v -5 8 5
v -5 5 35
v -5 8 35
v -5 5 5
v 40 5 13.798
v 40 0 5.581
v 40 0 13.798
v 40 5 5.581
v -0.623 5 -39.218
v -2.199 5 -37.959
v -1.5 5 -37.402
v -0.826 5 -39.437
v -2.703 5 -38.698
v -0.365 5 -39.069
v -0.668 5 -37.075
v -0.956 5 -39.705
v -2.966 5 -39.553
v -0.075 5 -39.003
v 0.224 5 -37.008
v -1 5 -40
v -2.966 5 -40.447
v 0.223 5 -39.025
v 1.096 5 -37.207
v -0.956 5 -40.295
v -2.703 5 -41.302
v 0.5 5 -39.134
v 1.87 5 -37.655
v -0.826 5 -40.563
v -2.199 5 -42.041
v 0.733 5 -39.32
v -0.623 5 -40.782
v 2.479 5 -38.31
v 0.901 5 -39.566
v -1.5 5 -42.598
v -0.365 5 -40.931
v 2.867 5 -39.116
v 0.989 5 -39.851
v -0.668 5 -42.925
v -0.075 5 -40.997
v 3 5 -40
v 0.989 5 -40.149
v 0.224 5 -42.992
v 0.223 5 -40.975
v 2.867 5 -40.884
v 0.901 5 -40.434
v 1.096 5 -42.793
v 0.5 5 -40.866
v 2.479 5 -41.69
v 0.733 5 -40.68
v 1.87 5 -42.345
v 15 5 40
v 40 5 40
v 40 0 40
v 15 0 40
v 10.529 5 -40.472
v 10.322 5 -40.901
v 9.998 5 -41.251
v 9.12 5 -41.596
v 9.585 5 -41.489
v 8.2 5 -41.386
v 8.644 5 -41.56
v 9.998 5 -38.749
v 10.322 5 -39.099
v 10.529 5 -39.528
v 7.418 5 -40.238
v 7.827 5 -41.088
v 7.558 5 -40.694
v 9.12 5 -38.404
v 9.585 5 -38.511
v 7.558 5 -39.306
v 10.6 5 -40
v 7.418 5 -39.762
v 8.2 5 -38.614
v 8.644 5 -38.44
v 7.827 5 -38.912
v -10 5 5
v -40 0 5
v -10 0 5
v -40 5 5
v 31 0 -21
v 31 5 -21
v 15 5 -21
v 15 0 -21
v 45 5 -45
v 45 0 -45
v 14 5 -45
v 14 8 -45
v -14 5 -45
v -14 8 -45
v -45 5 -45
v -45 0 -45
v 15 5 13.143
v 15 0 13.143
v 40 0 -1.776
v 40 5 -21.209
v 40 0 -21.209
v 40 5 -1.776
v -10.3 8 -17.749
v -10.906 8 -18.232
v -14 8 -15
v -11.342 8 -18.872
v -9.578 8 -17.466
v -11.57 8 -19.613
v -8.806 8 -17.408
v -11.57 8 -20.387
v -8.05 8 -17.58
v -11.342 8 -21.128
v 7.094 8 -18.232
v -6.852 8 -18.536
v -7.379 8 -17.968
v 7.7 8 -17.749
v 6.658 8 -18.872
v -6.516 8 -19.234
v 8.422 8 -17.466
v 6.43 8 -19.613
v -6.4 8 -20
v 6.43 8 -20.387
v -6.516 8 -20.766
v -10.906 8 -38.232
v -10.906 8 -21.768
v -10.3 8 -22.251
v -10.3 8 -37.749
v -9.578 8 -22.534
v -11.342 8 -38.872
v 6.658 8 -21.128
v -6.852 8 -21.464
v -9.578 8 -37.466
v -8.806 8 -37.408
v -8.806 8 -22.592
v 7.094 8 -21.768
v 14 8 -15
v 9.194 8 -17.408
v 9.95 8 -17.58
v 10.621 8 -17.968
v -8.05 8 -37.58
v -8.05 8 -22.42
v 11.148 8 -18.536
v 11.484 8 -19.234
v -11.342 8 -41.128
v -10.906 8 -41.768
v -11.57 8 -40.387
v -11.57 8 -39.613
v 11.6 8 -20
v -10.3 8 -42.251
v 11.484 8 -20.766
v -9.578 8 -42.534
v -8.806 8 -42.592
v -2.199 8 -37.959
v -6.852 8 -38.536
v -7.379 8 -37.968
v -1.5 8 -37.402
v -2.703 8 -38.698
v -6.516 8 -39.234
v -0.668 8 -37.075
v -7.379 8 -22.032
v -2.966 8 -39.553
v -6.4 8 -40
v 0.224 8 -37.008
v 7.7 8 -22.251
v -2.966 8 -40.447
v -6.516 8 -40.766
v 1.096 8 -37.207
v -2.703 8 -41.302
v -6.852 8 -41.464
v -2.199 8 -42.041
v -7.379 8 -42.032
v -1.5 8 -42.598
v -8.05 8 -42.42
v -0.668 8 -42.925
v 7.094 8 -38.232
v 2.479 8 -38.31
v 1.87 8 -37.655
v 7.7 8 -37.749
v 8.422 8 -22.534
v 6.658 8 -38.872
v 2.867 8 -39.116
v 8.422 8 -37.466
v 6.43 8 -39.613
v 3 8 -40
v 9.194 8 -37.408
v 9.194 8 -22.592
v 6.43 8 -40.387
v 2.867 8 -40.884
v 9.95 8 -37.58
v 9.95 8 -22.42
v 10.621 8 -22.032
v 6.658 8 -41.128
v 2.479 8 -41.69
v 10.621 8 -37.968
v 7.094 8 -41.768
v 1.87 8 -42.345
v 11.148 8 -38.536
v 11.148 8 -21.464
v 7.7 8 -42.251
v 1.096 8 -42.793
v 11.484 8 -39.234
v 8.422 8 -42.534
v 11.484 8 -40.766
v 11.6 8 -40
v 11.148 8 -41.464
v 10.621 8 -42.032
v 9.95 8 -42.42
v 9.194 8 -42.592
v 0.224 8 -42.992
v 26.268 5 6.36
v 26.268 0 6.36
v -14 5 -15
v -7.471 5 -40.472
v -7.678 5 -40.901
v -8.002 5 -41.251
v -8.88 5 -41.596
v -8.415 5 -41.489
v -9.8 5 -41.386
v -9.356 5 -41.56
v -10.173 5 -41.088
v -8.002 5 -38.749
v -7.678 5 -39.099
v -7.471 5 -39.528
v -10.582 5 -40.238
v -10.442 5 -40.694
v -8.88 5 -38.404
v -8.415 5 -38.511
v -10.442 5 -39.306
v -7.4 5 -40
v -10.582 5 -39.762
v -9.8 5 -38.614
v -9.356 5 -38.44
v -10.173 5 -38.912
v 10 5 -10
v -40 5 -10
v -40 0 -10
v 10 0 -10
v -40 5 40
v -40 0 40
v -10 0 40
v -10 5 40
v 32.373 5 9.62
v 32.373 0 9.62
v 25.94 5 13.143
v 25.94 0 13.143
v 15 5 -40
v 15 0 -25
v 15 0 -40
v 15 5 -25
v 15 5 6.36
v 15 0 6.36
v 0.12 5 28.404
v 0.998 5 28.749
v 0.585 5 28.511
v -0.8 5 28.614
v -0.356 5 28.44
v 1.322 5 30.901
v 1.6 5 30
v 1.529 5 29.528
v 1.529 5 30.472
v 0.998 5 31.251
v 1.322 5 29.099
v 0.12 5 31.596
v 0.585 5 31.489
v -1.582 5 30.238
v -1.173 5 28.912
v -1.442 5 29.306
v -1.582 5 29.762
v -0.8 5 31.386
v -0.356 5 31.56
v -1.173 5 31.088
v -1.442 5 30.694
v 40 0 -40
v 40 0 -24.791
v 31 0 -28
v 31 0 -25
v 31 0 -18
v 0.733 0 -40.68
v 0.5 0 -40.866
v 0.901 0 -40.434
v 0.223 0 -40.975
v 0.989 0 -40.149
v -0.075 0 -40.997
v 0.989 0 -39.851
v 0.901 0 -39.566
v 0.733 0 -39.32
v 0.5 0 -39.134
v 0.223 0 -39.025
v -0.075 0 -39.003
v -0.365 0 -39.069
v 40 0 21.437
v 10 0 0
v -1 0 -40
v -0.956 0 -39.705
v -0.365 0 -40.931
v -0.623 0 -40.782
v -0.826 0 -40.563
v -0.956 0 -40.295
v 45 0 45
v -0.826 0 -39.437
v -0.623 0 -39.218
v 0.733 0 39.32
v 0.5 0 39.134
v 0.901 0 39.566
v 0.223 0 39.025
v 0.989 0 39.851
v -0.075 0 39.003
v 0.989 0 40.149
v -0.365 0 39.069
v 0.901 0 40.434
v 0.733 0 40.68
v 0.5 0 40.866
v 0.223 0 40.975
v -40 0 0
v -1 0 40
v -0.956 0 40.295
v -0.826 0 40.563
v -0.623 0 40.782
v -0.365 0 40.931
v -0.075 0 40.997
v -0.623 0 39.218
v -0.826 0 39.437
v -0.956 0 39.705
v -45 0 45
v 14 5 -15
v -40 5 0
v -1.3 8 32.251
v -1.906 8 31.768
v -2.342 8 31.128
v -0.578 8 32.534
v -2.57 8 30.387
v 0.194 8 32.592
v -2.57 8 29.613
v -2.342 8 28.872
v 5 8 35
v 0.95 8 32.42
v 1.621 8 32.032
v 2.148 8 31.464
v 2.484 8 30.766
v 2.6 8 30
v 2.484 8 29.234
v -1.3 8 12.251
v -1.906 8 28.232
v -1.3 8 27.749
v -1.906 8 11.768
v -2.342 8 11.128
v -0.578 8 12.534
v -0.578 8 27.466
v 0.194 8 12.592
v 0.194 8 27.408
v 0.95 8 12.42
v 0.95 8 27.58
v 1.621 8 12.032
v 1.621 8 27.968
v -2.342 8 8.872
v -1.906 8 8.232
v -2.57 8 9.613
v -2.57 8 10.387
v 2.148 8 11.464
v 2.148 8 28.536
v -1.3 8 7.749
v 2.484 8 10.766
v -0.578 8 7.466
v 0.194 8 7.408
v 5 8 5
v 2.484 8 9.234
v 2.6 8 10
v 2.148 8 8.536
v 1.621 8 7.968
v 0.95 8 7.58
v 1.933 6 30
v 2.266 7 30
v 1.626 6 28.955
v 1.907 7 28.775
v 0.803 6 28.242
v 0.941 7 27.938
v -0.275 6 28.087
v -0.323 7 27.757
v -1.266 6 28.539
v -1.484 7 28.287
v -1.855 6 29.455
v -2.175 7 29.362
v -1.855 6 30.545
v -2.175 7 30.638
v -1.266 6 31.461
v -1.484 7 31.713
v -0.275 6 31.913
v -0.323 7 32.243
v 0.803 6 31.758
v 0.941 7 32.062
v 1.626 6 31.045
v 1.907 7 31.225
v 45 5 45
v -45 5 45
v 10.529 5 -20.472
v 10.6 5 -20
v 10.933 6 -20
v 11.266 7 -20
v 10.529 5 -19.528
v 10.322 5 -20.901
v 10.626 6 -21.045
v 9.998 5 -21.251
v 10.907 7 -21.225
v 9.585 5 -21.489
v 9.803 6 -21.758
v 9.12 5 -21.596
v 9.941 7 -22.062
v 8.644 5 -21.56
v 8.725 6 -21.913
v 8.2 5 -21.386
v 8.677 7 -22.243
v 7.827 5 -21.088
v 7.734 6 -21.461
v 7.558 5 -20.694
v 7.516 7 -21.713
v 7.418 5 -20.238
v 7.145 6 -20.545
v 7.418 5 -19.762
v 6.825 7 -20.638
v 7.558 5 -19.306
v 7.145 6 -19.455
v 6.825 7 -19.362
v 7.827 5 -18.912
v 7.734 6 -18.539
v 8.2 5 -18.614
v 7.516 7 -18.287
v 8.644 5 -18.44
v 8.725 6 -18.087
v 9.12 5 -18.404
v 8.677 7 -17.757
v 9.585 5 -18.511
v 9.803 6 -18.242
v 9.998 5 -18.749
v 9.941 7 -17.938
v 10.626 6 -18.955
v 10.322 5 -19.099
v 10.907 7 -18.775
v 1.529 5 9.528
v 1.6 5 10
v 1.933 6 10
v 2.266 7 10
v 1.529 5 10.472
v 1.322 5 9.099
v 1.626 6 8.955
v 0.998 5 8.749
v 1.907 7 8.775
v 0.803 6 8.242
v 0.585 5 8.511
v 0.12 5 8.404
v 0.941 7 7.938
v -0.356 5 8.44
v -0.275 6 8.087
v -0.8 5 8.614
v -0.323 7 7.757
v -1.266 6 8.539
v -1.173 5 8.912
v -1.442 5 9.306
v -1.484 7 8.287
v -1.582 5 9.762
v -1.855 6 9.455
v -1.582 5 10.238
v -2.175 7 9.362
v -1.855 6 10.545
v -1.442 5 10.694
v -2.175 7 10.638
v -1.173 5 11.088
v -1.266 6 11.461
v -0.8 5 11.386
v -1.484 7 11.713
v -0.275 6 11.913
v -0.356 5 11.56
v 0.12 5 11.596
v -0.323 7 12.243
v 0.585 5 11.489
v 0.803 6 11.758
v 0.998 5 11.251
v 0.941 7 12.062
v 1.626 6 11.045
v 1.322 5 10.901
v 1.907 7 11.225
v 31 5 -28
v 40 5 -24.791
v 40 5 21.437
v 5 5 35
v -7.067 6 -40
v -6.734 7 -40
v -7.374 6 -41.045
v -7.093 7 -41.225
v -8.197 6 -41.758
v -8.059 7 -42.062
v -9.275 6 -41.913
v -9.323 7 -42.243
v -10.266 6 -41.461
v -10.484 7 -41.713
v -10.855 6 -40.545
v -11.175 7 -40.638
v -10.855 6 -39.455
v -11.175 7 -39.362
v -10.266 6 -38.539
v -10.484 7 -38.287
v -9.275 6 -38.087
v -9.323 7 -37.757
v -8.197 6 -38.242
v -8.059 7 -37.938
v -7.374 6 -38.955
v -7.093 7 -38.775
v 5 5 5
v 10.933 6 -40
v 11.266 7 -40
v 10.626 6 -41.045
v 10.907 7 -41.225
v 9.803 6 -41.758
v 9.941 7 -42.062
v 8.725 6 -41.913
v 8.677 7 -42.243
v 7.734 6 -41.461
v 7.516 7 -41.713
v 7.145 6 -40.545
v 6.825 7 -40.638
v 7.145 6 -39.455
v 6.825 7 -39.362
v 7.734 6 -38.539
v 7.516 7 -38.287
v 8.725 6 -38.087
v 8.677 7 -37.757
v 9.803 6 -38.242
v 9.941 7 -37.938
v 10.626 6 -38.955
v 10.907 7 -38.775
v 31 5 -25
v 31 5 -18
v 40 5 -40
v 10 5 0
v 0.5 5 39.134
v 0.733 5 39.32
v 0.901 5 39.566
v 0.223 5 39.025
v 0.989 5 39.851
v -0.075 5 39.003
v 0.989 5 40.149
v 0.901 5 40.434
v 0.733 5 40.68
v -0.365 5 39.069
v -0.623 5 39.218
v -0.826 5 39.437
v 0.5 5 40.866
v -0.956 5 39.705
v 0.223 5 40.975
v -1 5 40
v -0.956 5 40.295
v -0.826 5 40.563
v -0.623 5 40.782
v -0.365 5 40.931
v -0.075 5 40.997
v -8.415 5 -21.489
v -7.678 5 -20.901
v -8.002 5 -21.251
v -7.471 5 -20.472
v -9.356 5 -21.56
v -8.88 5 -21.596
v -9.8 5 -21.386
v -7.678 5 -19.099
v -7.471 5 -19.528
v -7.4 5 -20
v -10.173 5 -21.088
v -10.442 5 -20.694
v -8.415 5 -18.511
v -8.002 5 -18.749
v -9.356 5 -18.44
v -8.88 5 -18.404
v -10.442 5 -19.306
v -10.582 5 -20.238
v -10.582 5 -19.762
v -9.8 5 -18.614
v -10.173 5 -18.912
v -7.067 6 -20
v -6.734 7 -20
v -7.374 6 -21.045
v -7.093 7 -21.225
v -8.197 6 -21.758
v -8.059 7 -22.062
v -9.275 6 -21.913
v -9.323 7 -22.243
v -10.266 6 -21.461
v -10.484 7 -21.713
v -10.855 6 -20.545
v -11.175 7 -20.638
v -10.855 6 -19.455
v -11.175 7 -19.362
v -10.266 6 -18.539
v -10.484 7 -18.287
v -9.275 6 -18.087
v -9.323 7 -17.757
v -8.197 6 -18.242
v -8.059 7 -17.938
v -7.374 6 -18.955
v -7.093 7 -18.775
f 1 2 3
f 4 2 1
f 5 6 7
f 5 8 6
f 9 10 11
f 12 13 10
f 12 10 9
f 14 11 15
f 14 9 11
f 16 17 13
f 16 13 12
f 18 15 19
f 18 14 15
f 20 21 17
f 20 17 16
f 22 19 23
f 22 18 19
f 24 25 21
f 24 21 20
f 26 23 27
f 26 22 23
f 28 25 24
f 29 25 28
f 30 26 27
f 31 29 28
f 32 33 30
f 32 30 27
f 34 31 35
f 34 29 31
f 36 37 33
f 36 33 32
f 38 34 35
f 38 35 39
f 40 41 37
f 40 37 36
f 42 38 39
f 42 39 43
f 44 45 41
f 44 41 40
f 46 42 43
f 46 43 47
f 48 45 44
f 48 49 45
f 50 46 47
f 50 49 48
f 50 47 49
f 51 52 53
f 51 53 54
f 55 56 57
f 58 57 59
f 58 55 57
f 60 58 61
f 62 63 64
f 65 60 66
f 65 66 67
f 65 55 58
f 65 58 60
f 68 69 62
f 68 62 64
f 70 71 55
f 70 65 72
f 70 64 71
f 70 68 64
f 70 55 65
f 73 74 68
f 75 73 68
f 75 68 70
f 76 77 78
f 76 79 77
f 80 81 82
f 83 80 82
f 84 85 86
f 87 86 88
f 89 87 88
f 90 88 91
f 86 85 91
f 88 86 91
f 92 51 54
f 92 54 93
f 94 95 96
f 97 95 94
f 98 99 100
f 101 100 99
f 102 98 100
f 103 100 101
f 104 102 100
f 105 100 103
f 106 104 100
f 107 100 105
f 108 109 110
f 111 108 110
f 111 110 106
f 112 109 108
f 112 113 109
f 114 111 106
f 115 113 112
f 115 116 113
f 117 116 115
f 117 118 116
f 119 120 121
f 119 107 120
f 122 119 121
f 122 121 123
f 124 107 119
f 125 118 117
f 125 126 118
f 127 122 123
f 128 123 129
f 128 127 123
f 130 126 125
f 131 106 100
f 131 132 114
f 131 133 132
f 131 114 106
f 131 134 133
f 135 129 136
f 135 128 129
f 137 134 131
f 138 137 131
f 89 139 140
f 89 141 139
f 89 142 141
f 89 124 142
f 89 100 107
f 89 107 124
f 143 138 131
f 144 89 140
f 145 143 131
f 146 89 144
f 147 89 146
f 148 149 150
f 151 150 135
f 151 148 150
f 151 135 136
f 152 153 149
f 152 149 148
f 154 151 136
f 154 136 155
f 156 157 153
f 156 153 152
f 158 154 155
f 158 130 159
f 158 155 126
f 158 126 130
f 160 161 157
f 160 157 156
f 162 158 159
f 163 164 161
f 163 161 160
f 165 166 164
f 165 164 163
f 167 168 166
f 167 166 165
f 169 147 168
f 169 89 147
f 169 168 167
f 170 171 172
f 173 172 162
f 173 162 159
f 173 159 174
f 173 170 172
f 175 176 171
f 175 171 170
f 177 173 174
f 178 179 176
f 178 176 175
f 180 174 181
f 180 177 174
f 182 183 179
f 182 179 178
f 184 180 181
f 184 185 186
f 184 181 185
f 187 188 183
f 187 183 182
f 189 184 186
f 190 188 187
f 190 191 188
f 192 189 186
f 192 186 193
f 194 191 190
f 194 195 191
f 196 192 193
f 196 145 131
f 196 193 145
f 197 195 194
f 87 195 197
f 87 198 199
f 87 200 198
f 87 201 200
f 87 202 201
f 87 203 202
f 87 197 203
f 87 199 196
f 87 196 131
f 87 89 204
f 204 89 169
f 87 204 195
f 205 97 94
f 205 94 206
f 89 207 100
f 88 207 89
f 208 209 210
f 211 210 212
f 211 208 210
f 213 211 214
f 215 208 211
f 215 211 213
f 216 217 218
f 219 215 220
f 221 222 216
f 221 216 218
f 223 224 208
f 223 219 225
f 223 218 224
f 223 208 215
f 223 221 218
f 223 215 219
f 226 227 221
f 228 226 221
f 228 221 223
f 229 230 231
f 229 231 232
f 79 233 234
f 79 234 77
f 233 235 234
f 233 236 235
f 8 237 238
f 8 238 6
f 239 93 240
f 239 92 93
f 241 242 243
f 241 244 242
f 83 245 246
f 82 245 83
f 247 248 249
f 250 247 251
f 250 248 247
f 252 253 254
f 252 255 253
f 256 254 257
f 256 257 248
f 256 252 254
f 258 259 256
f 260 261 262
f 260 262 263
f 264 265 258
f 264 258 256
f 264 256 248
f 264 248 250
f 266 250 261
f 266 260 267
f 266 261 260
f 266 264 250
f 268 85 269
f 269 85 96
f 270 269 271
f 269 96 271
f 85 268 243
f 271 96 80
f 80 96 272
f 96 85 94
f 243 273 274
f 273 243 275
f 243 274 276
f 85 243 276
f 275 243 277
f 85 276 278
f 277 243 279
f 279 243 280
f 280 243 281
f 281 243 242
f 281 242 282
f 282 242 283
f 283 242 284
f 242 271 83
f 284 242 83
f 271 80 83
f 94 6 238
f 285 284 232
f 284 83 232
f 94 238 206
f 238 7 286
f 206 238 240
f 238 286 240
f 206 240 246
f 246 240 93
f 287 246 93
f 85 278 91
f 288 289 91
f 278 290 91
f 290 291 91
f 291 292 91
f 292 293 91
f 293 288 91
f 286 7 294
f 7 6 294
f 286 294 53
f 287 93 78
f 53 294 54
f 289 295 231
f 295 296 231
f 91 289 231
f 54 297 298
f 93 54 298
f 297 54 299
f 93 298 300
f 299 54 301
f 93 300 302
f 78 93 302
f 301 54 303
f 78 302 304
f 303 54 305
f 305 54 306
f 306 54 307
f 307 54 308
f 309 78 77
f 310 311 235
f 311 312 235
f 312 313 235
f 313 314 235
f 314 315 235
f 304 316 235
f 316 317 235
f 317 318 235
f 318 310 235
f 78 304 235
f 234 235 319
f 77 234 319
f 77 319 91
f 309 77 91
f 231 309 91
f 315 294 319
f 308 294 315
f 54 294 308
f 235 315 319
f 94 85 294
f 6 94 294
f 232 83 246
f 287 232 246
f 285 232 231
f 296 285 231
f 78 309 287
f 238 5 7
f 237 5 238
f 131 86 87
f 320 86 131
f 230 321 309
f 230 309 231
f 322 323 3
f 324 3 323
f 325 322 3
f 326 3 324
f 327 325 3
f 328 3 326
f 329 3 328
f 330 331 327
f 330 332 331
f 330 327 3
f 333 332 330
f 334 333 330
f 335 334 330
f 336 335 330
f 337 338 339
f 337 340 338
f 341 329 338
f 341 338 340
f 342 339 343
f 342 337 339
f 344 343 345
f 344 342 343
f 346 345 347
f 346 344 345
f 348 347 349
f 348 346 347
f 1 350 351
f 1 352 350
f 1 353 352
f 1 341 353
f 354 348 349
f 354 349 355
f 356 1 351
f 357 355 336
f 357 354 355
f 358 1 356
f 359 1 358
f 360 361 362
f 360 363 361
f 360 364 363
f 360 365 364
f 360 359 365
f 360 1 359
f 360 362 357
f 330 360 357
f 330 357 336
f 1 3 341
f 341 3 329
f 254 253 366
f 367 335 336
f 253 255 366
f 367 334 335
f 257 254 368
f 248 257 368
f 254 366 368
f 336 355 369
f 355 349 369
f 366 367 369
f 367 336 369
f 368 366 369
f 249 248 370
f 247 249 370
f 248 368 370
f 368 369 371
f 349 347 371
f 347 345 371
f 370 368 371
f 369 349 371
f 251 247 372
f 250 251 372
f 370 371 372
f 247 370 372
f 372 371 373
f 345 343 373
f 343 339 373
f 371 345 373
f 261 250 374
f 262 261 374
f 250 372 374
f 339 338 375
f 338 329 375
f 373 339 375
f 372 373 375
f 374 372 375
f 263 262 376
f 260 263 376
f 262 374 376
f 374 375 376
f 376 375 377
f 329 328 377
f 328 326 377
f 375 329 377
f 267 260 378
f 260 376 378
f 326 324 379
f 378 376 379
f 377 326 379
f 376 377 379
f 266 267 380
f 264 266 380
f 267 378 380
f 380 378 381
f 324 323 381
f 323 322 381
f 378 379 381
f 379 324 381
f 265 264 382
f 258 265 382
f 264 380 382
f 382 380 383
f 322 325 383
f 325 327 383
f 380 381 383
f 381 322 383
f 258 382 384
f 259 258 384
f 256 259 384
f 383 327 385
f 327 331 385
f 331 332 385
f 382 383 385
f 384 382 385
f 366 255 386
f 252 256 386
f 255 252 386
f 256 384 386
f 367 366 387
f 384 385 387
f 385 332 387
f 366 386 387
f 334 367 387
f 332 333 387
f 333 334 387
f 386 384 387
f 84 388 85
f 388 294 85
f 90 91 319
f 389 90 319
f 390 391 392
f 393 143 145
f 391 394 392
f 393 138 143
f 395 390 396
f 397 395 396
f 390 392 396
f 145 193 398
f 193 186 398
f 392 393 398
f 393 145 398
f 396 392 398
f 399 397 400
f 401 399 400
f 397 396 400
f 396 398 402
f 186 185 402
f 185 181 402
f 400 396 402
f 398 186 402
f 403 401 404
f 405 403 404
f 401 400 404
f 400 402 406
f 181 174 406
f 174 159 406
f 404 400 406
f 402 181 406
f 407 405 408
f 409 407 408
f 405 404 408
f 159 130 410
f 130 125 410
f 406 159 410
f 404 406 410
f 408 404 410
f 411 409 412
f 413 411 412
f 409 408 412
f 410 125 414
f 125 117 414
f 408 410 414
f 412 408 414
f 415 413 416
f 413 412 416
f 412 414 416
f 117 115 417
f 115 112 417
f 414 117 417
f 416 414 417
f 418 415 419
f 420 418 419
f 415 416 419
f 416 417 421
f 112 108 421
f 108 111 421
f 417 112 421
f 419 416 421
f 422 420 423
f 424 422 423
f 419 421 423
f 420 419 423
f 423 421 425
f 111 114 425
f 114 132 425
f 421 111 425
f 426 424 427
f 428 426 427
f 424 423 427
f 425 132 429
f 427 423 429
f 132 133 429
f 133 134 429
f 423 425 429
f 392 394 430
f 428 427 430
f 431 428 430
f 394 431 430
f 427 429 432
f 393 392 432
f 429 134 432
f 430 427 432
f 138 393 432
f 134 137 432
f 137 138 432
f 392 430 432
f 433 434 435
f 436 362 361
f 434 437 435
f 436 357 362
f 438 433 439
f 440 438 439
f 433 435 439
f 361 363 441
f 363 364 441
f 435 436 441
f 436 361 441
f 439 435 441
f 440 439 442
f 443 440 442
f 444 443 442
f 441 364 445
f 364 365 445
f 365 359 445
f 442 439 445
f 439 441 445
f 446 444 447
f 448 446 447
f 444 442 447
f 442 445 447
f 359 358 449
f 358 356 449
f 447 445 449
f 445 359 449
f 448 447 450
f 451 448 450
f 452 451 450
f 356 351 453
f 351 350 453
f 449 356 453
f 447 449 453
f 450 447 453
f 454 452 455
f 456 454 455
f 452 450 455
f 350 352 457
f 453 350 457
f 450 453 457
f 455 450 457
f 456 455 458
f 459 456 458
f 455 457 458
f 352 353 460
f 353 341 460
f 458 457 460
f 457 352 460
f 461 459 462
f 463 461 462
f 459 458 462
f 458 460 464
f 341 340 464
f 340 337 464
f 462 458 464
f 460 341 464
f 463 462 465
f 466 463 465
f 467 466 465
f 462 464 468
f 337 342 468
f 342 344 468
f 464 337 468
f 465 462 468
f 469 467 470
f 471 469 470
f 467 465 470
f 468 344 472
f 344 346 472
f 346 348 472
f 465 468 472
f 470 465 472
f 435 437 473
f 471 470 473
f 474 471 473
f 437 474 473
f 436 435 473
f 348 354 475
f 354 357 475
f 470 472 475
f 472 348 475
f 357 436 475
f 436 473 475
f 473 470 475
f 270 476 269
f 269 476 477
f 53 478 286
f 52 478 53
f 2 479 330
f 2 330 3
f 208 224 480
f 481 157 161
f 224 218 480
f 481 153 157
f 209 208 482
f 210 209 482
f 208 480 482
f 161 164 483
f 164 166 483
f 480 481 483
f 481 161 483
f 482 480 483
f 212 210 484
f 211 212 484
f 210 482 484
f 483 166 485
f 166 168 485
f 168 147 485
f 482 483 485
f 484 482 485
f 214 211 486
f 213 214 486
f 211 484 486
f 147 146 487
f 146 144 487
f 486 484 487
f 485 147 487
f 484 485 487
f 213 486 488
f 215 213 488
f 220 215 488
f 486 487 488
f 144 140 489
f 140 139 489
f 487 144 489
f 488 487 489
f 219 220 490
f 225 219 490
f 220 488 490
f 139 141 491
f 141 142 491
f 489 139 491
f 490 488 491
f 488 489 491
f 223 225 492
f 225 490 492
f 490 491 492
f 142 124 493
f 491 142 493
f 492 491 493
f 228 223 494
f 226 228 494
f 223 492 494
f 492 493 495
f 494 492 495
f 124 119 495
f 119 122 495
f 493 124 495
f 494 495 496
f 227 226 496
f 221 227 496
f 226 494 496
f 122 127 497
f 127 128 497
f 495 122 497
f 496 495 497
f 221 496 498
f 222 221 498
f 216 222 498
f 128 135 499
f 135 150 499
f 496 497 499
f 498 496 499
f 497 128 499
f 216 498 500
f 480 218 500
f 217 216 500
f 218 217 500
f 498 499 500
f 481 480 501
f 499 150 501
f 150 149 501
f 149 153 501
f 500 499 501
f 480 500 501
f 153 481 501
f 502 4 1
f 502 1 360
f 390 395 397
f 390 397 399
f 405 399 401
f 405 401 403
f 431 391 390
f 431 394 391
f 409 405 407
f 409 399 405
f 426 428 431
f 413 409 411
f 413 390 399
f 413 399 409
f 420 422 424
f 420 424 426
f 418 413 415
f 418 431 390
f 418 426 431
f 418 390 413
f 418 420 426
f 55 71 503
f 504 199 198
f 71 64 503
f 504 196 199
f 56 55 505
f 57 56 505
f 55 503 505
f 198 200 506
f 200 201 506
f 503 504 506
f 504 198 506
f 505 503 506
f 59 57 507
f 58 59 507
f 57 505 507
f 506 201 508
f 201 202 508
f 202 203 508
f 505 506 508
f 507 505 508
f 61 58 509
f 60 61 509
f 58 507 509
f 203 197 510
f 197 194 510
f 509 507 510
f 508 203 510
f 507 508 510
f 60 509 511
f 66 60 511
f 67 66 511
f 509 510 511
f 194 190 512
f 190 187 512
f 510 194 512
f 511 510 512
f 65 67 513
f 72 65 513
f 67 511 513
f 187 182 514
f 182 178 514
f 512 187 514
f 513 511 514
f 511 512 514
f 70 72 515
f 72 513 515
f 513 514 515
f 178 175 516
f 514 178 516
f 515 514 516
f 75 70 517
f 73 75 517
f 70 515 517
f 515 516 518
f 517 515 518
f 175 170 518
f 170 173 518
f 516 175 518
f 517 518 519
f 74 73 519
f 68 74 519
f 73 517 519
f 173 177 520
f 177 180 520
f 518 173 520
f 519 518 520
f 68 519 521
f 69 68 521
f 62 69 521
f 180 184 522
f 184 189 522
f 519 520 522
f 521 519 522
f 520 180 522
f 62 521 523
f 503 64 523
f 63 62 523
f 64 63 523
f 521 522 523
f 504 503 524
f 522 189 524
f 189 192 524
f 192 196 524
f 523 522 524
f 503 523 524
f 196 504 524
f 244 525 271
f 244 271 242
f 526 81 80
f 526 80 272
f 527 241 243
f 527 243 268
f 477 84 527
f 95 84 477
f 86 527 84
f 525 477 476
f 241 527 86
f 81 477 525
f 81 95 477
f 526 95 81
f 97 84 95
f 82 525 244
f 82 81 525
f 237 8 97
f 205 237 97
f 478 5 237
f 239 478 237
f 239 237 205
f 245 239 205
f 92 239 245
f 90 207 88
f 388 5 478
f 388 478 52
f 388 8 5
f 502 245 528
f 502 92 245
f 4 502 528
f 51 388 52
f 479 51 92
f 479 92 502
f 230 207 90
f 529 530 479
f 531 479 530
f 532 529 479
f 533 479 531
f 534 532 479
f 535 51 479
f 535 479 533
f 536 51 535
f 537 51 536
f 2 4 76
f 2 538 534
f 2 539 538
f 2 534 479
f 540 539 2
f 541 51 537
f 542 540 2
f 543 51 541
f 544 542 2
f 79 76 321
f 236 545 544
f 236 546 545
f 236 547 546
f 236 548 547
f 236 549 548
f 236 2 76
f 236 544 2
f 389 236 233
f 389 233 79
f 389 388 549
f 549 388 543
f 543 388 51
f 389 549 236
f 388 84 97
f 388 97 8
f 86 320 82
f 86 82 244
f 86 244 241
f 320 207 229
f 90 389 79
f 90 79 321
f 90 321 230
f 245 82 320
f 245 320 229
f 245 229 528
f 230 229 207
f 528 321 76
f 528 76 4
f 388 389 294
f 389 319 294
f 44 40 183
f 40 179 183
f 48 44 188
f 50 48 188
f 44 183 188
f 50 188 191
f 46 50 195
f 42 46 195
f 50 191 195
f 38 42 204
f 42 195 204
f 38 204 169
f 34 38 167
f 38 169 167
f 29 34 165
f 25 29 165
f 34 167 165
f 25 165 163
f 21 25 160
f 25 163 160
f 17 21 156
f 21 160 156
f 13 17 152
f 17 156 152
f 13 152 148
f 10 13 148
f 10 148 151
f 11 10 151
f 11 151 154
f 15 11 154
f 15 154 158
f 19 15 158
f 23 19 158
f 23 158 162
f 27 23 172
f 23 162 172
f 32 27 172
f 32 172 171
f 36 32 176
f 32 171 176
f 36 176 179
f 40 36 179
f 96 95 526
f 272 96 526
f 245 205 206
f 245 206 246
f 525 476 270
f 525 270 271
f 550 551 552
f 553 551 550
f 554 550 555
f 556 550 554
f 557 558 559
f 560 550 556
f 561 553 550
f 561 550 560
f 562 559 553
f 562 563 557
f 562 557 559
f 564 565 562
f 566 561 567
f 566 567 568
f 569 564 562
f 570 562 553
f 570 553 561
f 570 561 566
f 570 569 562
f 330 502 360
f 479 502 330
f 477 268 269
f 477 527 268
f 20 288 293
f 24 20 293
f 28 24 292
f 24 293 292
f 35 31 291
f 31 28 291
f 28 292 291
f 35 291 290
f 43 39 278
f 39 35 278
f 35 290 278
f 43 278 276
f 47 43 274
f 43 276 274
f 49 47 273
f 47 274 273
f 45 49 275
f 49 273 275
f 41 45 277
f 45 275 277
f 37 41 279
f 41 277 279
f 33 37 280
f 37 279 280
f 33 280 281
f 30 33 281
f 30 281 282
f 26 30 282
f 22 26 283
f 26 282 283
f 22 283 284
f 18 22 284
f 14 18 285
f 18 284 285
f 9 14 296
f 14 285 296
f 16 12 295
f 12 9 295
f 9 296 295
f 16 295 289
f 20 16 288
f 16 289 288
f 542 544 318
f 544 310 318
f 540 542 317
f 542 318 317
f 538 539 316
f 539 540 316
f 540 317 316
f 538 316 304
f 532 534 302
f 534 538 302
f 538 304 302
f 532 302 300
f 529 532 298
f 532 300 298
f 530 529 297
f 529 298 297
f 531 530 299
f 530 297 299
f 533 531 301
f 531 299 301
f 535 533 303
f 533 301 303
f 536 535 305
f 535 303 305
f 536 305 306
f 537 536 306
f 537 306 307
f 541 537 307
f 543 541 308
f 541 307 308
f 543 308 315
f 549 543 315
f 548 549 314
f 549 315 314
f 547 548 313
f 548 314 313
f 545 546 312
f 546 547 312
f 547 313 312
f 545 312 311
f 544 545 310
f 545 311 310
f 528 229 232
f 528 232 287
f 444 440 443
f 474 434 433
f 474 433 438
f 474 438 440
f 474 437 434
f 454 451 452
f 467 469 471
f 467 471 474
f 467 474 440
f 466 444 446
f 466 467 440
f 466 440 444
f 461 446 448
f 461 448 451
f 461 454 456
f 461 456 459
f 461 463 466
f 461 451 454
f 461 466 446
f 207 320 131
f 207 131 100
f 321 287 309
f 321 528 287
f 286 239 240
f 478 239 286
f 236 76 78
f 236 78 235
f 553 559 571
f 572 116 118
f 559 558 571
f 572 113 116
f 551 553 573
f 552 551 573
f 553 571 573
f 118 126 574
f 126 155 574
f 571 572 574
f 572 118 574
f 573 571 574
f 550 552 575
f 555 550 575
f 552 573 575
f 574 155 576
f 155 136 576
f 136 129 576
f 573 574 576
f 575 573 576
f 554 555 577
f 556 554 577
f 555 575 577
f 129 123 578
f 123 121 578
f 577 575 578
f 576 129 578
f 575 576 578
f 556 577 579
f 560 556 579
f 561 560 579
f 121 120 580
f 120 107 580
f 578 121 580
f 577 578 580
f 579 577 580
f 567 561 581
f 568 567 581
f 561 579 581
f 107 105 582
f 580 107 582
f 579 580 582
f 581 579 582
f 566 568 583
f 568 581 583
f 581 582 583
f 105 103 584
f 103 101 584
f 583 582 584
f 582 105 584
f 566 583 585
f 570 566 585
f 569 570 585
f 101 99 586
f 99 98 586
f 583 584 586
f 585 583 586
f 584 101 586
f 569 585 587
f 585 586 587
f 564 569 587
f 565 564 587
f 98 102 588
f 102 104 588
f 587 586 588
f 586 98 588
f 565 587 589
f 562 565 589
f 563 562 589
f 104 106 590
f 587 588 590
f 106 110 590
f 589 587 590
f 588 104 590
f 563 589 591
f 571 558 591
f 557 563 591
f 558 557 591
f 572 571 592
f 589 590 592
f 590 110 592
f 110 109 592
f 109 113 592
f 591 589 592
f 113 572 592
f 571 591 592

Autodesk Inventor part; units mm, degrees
ref_plane "YZ Plane" through (0, 0, 0) normal (1, 0, 0) x (0, 1, 0)
ref_plane "Arbeitsebene1" through (-75, 27.1, 0) normal (0, 0, 1) x (0, 1, 0)
sketch "center1" plane through (-75, 27.1, 0) normal (0, 0, 1) x (0, 1, 0)
  line L0 (-173.891, -75) -> (168.1592, -75)
  line L1 (0, 239.86) -> (0, -220.81)
  point P0 (-27.1, -75)
ref_plane "Arbeitsebene2" through (0, 99.4, -2.4) normal (-1, 0, 0) x (0, 0, 1)
sketch "center2" plane through (0, 99.4, -2.4) normal (-1, 0, 0) x (0, 0, 1)
  line L0 (184.8129, -72.3) -> (-258.9785, -72.3)
  point P0 (2.4, -99.4)
sketch "Hallsens" plane through (0, 0, 0) normal (0, 1, 0) x (-1, 0, 0)
  line L0 (406.994, 0) -> (-237.944, 0) construction
  line L1 (0, -350.1368) -> (0, 271.1712) construction
  line L2 (-5, 0) -> (5, 0) construction
  line L3 (5, 0) -> (5, -20) construction
  line L4 (5, -20) -> (-5, -20) construction
  line L5 (-5, -20) -> (-5, 0) construction
  line L6 (-4, -1) -> (-6, -1)
  line L7 (-6, -1) -> (-6, 1)
  line L8 (-6, 1) -> (-4, 1)
  line L9 (-4, 1) -> (-4, -1)
  line L10 (-4, -1) -> (-6, 1) construction
  line L11 (-6, -1) -> (-4, 1) construction
  line L12 (4, -1) -> (6, -1)
  line L13 (6, -1) -> (6, 1)
  line L14 (6, 1) -> (4, 1)
  line L15 (4, 1) -> (4, -1)
  line L16 (4, -1) -> (6, 1) construction
  line L17 (6, -1) -> (4, 1) construction
  line L18 (4, -21) -> (6, -21)
  line L19 (6, -21) -> (6, -19)
  line L20 (6, -19) -> (4, -19)
  line L21 (4, -19) -> (4, -21)
  line L22 (4, -21) -> (6, -19) construction
  line L23 (6, -21) -> (4, -19) construction
  line L24 (-6, -21) -> (-4, -21)
  line L25 (-4, -21) -> (-4, -19)
  line L26 (-4, -19) -> (-6, -19)
  line L27 (-6, -19) -> (-6, -21)
  line L28 (-6, -21) -> (-4, -19) construction
  line L29 (-4, -21) -> (-6, -19) construction
  line L30 (-9, 10) -> (9, 10) construction
  line L31 (9, 10) -> (9, -40) construction
  line L32 (9, -40) -> (-9, -40) construction
  line L33 (-9, -40) -> (-9, 10) construction
  circle A0 centre (0, 10) radius 1.6
  circle A1 centre (9, -40) radius 1.6
  circle A2 centre (-9, -40) radius 1.6
  dimension "d126" = 10
  dimension "d127" = 20
  dimension "d128" = 5
  dimension "d129" = 2
  dimension "d130" = 4
  dimension "d131" = 4
  dimension "d132" = 10
  dimension "d133" = 20
  dimension "d134" = 3.2
sketch "Groundplane" plane through (0, 0, 0) normal (0, 1, 0) x (-1, 0, 0)
  line L0 (45, 45) -> (-45, 45) construction
  line L1 (-45, 45) -> (-45, -45) construction
  line L2 (-45, -45) -> (45, -45) construction
  line L3 (45, -45) -> (45, 45) construction
  line L4 (1, 45) -> (-1, 45) construction
  line L5 (-1, 45) -> (-1, 40) construction
  line L6 (-1, 40) -> (1, 40) construction
  line L7 (1, 40) -> (1, 45) construction
  arc A0 (-1, 40) -> (1, 40) centre (0, 40) ccw construction
  line L8 (1, -45) -> (-1, -45) construction
  line L9 (-1, -45) -> (-1, -40) construction
  line L10 (-1, -40) -> (1, -40) construction
  line L11 (1, -40) -> (1, -45) construction
  arc A1 (1, -40) -> (-1, -40) centre (0, -40) ccw construction
  point P0 (0, 0)
  dimension "d5" = 2
  dimension "d6" = 5
  dimension "d7" = 2
  dimension "d8" = 5
  dimension "d9" = 90
  dimension "d89" = 45
  dimension "d90" = 45
sketch "Montagepunkte" plane through (0, 0, 0) normal (0, 1, 0) x (-1, 0, 0)
  circle A0 centre (0, 10) radius 1.6 projected
  circle A1 centre (9, -40) radius 1.6 projected
  circle A2 centre (-9, -40) radius 1.6 projected
  arc A3 (1, -40) -> (-1, -40) centre (0, -40) ccw construction
  arc A4 (-1, 40) -> (1, 40) centre (0, 40) ccw construction
  circle A5 centre (0, 40) radius 1
  circle A6 centre (0, -40) radius 1
  line L0 (-9, -40) -> (9, -40) construction
  line L1 (9, -40) -> (9, -20) construction
  line L2 (9, -20) -> (-9, -20) construction
  line L3 (-9, -20) -> (-9, -40) construction
  line L4 (0, 10) -> (0, 30) construction
  circle A7 centre (9, -20) radius 1.6
  circle A8 centre (-9, -20) radius 1.6
  circle A9 centre (0, 30) radius 1.6
  dimension "d135" = 2
  dimension "d136" = 20
  dimension "d137" = 20
  dimension "d138" = 3.2
sketch "Skizze5" plane through (0, 0, 0) normal (0, 1, 0) x (-1, 0, 0)
  line L0 (45, 45) -> (-45, 45) projected
  line L1 (-45, 45) -> (-45, -45) projected
  line L2 (-45, -45) -> (45, -45) projected
  line L3 (45, -45) -> (45, 45) projected
  circle A0 centre (0, 40) radius 1 projected
  circle A1 centre (0, -40) radius 1 projected
extrude "Extrusion2" add sketch "Skizze5" along normal blind 5
sketch "Skizze6" plane through (0, 5, 0) normal (0, 1, 0) x (1, 0, 0)
  line L0 (-5, -5) -> (5, -5)
  line L1 (5, -5) -> (5, -35)
  line L2 (5, -35) -> (-5, -35)
  line L3 (-5, -35) -> (-5, -5)
  line L4 (-14, 45) -> (14, 45)
  line L5 (14, 45) -> (14, 15)
  line L6 (14, 15) -> (-14, 15)
  line L7 (-14, 15) -> (-14, 45)
  circle A0 centre (0, -40) radius 1 projected
  circle A1 centre (0, -40) radius 1 projected
  circle A2 centre (0, -30) radius 1.6 projected
  circle A3 centre (0, -10) radius 1.6 projected
  circle A4 centre (-9, 20) radius 1.6 projected
  circle A5 centre (9, 20) radius 1.6 projected
  circle A6 centre (9, 40) radius 1.6 projected
  circle A7 centre (-9, 40) radius 1.6 projected
  circle A8 centre (0, 40) radius 1 projected
  point P0 (0, 0)
  dimension "d139" = 5
  dimension "d140" = 5
  dimension "d141" = 5
  dimension "d142" = 5
  dimension "d143" = 5
  dimension "d144" = 5
  dimension "d145" = 5
  dimension "d146" = 5
extrude "Extrusion3" add sketch "Skizze6" along normal blind 3 contours L0 L1 L2 L3 | L4 L5 L6 L7
chamfer "Fase1" distance 1 distance2 3 4 edges at (7.4, 8, -20) (-10.6, 8, -20) (-10.6, 8, -40) (7.4, 8, -40) measured on face at (0.0402, 8, -27.0431)
chamfer "Fase2" distance 1 distance2 3 2 edges at (-1.6, 8, 30) (-1.6, 8, 10) measured on face at (3.8056, 8, 16.9145)
sketch "Skizze8" plane through (0, 8, 0) normal (0, 1, 0) x (1, 0, 0)
  circle A0 centre (0, 40) radius 3
  circle A1 centre (0, 40) radius 1 projected
  circle A2 centre (0, 40) radius 1 projected
  circle A3 centre (0, 40) radius 1 projected
  point P0 (0, 0)
  dimension "d99" = 6
extrude "Extrusion5" cut sketch "Skizze8" against normal up to surface (3 mm away) contours A0 | A1
sketch "Skizze9" plane through (0, 5, 0) normal (0, 1, 0) x (1, 0, 0)
  line L0 (15, 40) -> (40, 40)
  line L1 (40, 40) -> (40, -40)
  line L2 (40, -40) -> (15, -40)
  line L3 (15, -40) -> (15, 40)
  line L4 (15, 40) -> (15, -40) construction
  line L5 (31, 28) -> (31, 18)
  line L6 (31, 25) -> (15, 25)
  line L7 (31, 21) -> (15, 21)
  line L8 (15, 21) -> (15, 25)
  line L9 (31, 28) -> (41, 24.4341)
  line L10 (41, 24.4341) -> (41, 21.5659)
  line L11 (41, 21.5659) -> (31, 18)
  line L12 (-40, 10) -> (10, 10)
  line L13 (10, 10) -> (10, 0)
  line L14 (10, 0) -> (-40, 0)
  line L15 (-40, 0) -> (-40, 10)
  line L16 (-40, -5) -> (-10, -5)
  line L17 (-10, -5) -> (-10, -40)
  line L18 (-10, -40) -> (-40, -40)
  line L19 (-40, -40) -> (-40, -5)
  line L20 (-5, -5) -> (-5, -35) projected
  line L21 (-14, 15) -> (14, 15) projected
  line L22 (5, -5) -> (-5, -5) projected
  line L23 (-45, -45) -> (45, -45) construction
  line L24 (45, -45) -> (45, 45) construction
  line L25 (45, 45) -> (14, 45) construction
  line L26 (-14, 45) -> (-45, 45) construction
  line L27 (-45, 45) -> (-45, -45) construction
  point P0 (0, 0)
  point P1 (9, 45)
  point P2 (40, 23)
  point P3 (31, 23)
  point P4 (41, 23)
  point P5 (40, 21.2093)
  point P6 (40, 24.7907)
  point P7 (-40, -22.5)
  dimension "d106" = 25
  dimension "d107" = 0
  dimension "d108" = 3
  dimension "d109" = 3
  dimension "d110" = 4
  dimension "d111" = 9
  dimension "d112" = 15
  dimension "d115" = 1
  dimension "d118" = 5
  dimension "d119" = 5
  dimension "d123" = 5
  dimension "d124" = 5
  dimension "d125" = 5
  dimension "d147" = 5
  dimension "d148" = 5
  dimension "d149" = 5
  dimension "d150" = 5
  dimension "d151" = 5
  dimension "d152" = 5
extrude "Extrusion6" cut sketch "Skizze9" against normal through all contours L0 L1 L9 L5 L6 L3 | L7 L5 L11 L1 L2 L3 | L12 L13 L14 L15 | L16 L17 L18 L19
sketch "Skizze10" plane through (0, 5, 0) normal (0, 1, 0) x (1, 0, 0)
  line L0 (15, -40) -> (15, 21) construction
  line L1 (42, 2.9607) -> (26.2682, -6.3602)
  line L2 (26.2682, -6.3602) -> (15, -6.3602)
  line L3 (15, -6.3602) -> (15, -13.143)
  line L4 (15, -13.143) -> (25.94, -13.143)
  line L5 (25.94, -13.143) -> (42, -22.6171)
  line L6 (42, -22.6171) -> (42, -14.8934)
  line L7 (42, -14.8934) -> (32.3728, -9.6203)
  line L8 (32.3728, -9.6203) -> (42, -4.5223)
  line L9 (42, -4.5223) -> (42, 2.9607)
  point P0 (0, 0)
extrude "Extrusion7" add sketch "Skizze10" against normal up to surface (5 mm away)
properties part number "HallSensor_Halterung"
